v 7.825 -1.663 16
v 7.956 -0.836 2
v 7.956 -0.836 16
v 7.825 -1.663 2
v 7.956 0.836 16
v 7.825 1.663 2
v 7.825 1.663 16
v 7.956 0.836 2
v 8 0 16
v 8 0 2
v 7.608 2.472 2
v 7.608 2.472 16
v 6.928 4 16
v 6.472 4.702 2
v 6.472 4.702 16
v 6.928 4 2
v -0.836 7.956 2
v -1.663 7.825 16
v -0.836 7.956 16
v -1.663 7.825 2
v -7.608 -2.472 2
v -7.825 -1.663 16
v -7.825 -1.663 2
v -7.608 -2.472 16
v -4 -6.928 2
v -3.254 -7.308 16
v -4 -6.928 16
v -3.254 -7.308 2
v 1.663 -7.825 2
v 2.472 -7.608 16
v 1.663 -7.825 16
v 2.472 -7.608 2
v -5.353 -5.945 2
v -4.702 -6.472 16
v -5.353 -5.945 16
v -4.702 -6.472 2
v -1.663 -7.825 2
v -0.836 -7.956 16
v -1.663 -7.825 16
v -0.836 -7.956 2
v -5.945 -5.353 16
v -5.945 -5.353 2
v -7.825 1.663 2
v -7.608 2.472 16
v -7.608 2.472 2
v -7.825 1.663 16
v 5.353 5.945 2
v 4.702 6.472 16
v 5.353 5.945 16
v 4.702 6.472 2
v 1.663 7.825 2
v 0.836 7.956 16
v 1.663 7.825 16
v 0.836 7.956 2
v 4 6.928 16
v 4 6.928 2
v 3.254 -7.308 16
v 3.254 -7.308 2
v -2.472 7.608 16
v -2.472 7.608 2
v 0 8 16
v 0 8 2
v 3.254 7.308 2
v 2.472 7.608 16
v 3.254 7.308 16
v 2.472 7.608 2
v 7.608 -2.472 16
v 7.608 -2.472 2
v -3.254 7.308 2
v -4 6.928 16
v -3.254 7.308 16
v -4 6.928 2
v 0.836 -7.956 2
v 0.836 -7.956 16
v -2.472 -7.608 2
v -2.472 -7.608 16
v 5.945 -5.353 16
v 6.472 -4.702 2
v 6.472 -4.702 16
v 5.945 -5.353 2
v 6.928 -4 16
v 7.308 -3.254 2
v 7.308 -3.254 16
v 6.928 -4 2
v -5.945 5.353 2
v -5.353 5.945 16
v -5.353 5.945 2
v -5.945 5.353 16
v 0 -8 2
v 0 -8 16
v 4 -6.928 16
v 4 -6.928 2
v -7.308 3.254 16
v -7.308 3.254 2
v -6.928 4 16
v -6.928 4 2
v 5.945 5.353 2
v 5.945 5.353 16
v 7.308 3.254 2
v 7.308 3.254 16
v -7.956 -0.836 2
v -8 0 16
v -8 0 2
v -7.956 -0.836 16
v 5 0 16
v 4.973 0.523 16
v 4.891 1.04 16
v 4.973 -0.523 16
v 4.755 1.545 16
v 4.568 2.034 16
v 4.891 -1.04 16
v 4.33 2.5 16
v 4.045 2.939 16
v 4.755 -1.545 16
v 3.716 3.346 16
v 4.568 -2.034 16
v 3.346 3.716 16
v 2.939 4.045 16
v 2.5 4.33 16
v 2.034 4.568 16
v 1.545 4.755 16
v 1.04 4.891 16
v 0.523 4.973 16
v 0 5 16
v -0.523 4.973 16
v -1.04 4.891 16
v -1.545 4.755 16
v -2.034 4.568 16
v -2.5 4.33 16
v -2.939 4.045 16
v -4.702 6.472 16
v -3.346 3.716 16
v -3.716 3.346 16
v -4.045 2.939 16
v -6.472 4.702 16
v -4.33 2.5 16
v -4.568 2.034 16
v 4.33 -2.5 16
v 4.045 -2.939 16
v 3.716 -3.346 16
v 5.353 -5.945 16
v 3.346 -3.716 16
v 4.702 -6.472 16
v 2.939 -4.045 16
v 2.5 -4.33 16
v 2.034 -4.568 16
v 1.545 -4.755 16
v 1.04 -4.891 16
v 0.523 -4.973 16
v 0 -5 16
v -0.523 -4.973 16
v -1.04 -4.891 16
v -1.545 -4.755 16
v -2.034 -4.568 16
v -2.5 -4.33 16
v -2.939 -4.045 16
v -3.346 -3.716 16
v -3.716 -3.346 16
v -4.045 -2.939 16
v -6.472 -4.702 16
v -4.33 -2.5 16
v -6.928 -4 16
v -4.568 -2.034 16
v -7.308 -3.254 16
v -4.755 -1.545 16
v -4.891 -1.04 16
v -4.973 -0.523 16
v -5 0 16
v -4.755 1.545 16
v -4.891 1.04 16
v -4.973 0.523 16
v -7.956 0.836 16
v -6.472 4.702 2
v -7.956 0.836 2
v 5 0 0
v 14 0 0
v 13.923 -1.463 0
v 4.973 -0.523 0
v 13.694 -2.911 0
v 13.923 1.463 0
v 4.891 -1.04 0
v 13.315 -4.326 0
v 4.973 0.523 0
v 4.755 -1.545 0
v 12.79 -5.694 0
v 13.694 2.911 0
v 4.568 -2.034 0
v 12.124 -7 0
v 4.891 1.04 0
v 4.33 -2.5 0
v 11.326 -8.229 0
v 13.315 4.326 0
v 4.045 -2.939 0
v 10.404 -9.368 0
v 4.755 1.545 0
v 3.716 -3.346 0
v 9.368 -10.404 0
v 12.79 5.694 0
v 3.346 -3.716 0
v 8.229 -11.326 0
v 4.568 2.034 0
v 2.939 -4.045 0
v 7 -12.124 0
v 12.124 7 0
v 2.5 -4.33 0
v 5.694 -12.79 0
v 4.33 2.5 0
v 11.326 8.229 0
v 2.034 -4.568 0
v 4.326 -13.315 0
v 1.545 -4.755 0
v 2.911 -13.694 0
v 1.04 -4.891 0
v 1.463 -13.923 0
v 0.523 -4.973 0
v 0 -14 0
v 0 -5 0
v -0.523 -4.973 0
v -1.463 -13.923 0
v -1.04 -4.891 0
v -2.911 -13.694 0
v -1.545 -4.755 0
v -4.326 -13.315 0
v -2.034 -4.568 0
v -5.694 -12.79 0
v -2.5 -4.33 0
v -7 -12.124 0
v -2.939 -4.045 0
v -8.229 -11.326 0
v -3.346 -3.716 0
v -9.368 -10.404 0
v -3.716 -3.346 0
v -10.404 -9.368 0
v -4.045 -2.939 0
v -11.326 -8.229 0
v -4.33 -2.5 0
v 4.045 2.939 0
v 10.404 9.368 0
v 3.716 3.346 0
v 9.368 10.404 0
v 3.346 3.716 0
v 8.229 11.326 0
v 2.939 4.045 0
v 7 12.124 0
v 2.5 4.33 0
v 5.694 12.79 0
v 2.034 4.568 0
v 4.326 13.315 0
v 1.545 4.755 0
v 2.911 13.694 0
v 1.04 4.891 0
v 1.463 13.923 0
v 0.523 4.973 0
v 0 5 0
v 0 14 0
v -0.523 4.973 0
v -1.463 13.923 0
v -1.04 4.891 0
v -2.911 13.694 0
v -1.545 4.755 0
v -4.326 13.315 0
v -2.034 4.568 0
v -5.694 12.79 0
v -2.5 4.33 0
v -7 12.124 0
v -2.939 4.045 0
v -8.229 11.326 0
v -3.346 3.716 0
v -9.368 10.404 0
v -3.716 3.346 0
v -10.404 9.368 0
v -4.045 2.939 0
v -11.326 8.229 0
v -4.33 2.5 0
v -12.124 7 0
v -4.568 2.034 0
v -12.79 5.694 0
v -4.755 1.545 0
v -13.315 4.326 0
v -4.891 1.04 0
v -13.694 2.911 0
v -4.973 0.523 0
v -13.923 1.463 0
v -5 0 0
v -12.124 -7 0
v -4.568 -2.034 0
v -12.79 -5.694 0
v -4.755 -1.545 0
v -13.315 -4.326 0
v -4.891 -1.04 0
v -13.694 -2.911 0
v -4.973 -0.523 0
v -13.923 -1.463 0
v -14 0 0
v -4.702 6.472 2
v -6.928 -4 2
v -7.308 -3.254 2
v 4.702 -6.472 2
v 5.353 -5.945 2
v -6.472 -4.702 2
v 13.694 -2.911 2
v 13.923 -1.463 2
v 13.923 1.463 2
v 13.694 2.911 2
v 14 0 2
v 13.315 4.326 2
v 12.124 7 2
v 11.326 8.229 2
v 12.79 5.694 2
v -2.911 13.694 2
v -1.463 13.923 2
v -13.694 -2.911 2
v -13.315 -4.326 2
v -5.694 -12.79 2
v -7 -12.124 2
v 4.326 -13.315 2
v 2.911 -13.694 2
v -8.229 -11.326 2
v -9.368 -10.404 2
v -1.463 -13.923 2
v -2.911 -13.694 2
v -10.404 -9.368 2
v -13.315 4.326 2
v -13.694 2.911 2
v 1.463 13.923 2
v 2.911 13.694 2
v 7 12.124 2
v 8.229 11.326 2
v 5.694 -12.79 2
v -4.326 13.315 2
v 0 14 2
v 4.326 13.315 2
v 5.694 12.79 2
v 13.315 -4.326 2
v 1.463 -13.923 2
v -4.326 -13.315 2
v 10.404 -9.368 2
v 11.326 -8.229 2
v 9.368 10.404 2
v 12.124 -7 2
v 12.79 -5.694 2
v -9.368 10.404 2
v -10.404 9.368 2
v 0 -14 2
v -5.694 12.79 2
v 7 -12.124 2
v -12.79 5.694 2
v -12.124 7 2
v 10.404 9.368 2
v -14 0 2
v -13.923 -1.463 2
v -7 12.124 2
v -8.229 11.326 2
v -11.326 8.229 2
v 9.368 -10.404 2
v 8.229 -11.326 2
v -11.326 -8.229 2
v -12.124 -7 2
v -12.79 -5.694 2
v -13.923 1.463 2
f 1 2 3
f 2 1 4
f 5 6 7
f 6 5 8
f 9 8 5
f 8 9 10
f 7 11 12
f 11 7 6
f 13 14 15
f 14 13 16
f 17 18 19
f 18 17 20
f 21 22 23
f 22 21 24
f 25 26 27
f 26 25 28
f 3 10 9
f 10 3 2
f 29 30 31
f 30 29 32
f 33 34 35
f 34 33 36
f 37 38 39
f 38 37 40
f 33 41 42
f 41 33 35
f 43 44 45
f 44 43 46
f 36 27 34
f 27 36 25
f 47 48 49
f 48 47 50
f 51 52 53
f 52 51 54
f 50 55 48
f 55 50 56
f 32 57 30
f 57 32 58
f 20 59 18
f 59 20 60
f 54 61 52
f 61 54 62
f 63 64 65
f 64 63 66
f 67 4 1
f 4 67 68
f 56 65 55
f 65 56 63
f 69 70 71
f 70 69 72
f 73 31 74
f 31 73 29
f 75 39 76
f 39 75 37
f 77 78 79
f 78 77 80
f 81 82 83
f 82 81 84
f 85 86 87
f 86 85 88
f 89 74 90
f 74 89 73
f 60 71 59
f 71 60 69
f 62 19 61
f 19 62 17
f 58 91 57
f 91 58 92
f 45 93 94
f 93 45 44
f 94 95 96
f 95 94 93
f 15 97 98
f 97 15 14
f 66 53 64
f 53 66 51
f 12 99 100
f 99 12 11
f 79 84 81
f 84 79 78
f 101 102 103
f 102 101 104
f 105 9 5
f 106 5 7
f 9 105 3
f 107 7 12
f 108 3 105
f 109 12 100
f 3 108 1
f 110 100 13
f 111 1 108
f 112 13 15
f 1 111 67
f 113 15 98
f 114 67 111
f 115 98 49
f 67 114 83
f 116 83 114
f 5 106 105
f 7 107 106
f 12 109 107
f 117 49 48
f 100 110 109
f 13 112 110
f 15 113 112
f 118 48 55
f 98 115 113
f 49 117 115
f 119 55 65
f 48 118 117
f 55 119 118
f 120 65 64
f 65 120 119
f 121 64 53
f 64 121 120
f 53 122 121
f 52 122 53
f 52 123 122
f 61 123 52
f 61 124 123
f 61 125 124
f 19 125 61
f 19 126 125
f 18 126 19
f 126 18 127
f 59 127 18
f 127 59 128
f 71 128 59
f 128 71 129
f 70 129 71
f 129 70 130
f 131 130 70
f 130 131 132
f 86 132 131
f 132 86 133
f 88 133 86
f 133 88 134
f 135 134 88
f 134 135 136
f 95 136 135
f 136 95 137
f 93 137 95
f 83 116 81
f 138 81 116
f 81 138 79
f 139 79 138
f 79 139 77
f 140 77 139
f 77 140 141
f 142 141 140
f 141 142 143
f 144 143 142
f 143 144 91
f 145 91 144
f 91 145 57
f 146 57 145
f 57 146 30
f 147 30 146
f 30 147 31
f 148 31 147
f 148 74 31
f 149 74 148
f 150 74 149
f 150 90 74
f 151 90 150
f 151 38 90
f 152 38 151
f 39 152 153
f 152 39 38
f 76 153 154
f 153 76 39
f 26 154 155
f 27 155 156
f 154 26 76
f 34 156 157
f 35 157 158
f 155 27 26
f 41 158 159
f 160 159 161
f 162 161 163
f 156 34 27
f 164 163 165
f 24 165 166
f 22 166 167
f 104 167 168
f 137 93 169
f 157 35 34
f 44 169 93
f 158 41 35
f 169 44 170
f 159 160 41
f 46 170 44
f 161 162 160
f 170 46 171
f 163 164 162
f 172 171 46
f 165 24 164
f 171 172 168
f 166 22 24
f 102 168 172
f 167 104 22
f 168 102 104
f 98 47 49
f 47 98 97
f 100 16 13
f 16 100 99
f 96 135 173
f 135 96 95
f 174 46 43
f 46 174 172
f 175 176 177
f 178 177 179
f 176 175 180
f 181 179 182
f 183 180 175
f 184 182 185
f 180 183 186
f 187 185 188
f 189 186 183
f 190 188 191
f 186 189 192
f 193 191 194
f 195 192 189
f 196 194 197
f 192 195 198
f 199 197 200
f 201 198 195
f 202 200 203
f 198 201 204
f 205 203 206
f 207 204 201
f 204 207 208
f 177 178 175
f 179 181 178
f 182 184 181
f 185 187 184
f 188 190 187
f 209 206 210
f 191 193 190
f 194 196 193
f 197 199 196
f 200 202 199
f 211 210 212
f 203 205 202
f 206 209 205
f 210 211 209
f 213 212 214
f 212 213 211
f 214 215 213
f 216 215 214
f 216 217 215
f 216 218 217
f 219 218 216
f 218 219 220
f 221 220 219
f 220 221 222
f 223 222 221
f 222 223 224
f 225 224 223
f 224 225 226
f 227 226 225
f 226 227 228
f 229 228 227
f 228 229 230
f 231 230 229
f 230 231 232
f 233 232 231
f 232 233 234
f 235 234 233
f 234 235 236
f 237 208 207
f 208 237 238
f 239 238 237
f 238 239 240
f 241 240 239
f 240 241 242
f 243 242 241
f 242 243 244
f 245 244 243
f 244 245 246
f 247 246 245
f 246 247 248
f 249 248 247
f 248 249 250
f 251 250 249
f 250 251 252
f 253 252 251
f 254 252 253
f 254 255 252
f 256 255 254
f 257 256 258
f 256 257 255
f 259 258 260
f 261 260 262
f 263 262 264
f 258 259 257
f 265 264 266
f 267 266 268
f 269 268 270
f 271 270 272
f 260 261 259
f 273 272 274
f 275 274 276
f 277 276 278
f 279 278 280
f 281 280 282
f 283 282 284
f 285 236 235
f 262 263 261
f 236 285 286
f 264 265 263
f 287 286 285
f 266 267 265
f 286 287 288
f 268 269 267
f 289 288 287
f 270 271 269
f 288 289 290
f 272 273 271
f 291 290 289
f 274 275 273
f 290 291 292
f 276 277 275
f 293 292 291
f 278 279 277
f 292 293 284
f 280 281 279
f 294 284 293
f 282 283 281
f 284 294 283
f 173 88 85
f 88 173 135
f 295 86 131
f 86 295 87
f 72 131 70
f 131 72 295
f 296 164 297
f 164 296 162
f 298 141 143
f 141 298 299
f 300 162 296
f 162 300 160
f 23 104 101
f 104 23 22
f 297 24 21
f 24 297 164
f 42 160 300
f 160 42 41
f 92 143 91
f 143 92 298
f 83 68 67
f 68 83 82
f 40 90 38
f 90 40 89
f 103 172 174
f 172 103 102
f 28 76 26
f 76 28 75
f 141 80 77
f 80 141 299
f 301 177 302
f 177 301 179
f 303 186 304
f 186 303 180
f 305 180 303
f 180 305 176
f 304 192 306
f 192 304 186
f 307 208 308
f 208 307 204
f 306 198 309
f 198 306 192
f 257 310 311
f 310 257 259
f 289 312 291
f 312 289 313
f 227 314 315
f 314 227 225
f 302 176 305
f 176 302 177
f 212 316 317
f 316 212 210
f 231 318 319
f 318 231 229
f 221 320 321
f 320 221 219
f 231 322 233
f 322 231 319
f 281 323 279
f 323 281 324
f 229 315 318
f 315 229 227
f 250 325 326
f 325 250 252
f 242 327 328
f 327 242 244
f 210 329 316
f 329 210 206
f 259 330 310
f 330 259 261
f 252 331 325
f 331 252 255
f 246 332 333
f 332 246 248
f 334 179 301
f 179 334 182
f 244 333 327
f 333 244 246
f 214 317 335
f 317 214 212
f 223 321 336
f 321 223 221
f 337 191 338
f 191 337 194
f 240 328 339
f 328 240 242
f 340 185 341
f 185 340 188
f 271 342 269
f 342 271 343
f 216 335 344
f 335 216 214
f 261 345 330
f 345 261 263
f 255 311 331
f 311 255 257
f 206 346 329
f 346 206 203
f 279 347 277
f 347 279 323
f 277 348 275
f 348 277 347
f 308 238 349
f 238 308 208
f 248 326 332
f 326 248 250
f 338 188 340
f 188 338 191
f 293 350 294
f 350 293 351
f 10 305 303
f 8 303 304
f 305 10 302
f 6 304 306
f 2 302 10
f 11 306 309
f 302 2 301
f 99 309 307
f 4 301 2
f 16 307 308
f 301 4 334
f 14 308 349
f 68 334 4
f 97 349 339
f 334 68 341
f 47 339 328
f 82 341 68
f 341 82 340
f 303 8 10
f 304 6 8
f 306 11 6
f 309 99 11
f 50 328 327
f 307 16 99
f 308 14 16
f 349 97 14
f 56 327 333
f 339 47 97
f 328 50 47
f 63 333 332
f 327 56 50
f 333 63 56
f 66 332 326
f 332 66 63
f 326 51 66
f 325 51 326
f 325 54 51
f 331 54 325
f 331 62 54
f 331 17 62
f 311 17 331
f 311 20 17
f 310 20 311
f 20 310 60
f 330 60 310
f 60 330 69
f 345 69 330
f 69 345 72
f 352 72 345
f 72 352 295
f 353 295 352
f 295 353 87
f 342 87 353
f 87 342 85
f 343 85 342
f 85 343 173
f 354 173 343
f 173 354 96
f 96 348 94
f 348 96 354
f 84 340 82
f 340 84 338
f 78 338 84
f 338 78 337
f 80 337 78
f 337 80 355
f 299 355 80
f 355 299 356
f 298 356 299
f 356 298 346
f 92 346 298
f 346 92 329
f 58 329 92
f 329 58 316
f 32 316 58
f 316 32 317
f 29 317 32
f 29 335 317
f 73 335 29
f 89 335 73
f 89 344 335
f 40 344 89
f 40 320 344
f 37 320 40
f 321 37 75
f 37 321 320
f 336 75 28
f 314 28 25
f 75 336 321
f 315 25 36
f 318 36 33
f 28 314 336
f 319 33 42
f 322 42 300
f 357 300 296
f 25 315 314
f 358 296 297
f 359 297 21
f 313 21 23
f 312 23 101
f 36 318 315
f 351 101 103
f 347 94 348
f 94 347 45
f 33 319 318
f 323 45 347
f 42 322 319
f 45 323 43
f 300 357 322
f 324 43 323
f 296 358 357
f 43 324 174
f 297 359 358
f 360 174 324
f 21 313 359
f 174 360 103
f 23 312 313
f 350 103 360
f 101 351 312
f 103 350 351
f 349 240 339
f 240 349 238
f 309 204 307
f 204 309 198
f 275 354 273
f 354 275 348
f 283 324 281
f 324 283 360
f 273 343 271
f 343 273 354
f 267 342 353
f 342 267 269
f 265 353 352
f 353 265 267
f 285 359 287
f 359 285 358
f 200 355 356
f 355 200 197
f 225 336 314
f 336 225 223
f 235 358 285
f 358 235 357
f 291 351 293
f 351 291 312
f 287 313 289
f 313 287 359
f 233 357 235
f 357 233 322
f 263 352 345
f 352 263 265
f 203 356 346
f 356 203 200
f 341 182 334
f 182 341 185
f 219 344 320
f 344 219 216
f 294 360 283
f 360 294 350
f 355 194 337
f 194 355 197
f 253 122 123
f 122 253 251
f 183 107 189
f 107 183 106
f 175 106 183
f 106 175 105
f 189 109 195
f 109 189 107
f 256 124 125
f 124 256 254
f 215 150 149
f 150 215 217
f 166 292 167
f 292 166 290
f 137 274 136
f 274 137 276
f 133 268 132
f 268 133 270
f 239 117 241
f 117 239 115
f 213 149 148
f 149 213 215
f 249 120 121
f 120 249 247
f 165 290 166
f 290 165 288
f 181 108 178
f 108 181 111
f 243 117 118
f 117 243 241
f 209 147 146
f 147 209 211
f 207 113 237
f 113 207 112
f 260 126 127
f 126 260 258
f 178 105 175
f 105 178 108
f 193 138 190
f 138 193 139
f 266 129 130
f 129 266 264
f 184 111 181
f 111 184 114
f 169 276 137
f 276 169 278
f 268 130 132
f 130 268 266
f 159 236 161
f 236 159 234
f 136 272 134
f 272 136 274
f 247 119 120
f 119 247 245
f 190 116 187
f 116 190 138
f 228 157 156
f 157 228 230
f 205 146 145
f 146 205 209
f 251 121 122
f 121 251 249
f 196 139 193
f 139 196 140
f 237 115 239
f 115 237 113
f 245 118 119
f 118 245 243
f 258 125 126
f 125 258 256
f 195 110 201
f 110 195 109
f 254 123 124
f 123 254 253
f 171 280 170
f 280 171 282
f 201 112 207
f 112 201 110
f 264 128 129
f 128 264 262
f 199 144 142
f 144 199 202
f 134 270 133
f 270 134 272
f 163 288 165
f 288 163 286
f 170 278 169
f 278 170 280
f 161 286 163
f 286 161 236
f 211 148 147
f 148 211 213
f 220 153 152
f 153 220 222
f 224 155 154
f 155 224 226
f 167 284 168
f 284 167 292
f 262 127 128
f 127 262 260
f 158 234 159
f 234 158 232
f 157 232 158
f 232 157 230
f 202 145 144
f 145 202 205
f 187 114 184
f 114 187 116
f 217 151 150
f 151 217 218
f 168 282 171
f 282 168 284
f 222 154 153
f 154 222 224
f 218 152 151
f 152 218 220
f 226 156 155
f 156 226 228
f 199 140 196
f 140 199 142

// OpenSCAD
// Flanged spacer.
$fn = 60;
eps = 0.02;
inner_d = 10;
outer_d = 16;
length = 16;
flange_d = 28;
difference() { union() { cylinder(d=outer_d,h=length); cylinder(d=flange_d,h=2); } translate([0,0,-eps]) cylinder(d=inner_d,h=length+2*eps); }
